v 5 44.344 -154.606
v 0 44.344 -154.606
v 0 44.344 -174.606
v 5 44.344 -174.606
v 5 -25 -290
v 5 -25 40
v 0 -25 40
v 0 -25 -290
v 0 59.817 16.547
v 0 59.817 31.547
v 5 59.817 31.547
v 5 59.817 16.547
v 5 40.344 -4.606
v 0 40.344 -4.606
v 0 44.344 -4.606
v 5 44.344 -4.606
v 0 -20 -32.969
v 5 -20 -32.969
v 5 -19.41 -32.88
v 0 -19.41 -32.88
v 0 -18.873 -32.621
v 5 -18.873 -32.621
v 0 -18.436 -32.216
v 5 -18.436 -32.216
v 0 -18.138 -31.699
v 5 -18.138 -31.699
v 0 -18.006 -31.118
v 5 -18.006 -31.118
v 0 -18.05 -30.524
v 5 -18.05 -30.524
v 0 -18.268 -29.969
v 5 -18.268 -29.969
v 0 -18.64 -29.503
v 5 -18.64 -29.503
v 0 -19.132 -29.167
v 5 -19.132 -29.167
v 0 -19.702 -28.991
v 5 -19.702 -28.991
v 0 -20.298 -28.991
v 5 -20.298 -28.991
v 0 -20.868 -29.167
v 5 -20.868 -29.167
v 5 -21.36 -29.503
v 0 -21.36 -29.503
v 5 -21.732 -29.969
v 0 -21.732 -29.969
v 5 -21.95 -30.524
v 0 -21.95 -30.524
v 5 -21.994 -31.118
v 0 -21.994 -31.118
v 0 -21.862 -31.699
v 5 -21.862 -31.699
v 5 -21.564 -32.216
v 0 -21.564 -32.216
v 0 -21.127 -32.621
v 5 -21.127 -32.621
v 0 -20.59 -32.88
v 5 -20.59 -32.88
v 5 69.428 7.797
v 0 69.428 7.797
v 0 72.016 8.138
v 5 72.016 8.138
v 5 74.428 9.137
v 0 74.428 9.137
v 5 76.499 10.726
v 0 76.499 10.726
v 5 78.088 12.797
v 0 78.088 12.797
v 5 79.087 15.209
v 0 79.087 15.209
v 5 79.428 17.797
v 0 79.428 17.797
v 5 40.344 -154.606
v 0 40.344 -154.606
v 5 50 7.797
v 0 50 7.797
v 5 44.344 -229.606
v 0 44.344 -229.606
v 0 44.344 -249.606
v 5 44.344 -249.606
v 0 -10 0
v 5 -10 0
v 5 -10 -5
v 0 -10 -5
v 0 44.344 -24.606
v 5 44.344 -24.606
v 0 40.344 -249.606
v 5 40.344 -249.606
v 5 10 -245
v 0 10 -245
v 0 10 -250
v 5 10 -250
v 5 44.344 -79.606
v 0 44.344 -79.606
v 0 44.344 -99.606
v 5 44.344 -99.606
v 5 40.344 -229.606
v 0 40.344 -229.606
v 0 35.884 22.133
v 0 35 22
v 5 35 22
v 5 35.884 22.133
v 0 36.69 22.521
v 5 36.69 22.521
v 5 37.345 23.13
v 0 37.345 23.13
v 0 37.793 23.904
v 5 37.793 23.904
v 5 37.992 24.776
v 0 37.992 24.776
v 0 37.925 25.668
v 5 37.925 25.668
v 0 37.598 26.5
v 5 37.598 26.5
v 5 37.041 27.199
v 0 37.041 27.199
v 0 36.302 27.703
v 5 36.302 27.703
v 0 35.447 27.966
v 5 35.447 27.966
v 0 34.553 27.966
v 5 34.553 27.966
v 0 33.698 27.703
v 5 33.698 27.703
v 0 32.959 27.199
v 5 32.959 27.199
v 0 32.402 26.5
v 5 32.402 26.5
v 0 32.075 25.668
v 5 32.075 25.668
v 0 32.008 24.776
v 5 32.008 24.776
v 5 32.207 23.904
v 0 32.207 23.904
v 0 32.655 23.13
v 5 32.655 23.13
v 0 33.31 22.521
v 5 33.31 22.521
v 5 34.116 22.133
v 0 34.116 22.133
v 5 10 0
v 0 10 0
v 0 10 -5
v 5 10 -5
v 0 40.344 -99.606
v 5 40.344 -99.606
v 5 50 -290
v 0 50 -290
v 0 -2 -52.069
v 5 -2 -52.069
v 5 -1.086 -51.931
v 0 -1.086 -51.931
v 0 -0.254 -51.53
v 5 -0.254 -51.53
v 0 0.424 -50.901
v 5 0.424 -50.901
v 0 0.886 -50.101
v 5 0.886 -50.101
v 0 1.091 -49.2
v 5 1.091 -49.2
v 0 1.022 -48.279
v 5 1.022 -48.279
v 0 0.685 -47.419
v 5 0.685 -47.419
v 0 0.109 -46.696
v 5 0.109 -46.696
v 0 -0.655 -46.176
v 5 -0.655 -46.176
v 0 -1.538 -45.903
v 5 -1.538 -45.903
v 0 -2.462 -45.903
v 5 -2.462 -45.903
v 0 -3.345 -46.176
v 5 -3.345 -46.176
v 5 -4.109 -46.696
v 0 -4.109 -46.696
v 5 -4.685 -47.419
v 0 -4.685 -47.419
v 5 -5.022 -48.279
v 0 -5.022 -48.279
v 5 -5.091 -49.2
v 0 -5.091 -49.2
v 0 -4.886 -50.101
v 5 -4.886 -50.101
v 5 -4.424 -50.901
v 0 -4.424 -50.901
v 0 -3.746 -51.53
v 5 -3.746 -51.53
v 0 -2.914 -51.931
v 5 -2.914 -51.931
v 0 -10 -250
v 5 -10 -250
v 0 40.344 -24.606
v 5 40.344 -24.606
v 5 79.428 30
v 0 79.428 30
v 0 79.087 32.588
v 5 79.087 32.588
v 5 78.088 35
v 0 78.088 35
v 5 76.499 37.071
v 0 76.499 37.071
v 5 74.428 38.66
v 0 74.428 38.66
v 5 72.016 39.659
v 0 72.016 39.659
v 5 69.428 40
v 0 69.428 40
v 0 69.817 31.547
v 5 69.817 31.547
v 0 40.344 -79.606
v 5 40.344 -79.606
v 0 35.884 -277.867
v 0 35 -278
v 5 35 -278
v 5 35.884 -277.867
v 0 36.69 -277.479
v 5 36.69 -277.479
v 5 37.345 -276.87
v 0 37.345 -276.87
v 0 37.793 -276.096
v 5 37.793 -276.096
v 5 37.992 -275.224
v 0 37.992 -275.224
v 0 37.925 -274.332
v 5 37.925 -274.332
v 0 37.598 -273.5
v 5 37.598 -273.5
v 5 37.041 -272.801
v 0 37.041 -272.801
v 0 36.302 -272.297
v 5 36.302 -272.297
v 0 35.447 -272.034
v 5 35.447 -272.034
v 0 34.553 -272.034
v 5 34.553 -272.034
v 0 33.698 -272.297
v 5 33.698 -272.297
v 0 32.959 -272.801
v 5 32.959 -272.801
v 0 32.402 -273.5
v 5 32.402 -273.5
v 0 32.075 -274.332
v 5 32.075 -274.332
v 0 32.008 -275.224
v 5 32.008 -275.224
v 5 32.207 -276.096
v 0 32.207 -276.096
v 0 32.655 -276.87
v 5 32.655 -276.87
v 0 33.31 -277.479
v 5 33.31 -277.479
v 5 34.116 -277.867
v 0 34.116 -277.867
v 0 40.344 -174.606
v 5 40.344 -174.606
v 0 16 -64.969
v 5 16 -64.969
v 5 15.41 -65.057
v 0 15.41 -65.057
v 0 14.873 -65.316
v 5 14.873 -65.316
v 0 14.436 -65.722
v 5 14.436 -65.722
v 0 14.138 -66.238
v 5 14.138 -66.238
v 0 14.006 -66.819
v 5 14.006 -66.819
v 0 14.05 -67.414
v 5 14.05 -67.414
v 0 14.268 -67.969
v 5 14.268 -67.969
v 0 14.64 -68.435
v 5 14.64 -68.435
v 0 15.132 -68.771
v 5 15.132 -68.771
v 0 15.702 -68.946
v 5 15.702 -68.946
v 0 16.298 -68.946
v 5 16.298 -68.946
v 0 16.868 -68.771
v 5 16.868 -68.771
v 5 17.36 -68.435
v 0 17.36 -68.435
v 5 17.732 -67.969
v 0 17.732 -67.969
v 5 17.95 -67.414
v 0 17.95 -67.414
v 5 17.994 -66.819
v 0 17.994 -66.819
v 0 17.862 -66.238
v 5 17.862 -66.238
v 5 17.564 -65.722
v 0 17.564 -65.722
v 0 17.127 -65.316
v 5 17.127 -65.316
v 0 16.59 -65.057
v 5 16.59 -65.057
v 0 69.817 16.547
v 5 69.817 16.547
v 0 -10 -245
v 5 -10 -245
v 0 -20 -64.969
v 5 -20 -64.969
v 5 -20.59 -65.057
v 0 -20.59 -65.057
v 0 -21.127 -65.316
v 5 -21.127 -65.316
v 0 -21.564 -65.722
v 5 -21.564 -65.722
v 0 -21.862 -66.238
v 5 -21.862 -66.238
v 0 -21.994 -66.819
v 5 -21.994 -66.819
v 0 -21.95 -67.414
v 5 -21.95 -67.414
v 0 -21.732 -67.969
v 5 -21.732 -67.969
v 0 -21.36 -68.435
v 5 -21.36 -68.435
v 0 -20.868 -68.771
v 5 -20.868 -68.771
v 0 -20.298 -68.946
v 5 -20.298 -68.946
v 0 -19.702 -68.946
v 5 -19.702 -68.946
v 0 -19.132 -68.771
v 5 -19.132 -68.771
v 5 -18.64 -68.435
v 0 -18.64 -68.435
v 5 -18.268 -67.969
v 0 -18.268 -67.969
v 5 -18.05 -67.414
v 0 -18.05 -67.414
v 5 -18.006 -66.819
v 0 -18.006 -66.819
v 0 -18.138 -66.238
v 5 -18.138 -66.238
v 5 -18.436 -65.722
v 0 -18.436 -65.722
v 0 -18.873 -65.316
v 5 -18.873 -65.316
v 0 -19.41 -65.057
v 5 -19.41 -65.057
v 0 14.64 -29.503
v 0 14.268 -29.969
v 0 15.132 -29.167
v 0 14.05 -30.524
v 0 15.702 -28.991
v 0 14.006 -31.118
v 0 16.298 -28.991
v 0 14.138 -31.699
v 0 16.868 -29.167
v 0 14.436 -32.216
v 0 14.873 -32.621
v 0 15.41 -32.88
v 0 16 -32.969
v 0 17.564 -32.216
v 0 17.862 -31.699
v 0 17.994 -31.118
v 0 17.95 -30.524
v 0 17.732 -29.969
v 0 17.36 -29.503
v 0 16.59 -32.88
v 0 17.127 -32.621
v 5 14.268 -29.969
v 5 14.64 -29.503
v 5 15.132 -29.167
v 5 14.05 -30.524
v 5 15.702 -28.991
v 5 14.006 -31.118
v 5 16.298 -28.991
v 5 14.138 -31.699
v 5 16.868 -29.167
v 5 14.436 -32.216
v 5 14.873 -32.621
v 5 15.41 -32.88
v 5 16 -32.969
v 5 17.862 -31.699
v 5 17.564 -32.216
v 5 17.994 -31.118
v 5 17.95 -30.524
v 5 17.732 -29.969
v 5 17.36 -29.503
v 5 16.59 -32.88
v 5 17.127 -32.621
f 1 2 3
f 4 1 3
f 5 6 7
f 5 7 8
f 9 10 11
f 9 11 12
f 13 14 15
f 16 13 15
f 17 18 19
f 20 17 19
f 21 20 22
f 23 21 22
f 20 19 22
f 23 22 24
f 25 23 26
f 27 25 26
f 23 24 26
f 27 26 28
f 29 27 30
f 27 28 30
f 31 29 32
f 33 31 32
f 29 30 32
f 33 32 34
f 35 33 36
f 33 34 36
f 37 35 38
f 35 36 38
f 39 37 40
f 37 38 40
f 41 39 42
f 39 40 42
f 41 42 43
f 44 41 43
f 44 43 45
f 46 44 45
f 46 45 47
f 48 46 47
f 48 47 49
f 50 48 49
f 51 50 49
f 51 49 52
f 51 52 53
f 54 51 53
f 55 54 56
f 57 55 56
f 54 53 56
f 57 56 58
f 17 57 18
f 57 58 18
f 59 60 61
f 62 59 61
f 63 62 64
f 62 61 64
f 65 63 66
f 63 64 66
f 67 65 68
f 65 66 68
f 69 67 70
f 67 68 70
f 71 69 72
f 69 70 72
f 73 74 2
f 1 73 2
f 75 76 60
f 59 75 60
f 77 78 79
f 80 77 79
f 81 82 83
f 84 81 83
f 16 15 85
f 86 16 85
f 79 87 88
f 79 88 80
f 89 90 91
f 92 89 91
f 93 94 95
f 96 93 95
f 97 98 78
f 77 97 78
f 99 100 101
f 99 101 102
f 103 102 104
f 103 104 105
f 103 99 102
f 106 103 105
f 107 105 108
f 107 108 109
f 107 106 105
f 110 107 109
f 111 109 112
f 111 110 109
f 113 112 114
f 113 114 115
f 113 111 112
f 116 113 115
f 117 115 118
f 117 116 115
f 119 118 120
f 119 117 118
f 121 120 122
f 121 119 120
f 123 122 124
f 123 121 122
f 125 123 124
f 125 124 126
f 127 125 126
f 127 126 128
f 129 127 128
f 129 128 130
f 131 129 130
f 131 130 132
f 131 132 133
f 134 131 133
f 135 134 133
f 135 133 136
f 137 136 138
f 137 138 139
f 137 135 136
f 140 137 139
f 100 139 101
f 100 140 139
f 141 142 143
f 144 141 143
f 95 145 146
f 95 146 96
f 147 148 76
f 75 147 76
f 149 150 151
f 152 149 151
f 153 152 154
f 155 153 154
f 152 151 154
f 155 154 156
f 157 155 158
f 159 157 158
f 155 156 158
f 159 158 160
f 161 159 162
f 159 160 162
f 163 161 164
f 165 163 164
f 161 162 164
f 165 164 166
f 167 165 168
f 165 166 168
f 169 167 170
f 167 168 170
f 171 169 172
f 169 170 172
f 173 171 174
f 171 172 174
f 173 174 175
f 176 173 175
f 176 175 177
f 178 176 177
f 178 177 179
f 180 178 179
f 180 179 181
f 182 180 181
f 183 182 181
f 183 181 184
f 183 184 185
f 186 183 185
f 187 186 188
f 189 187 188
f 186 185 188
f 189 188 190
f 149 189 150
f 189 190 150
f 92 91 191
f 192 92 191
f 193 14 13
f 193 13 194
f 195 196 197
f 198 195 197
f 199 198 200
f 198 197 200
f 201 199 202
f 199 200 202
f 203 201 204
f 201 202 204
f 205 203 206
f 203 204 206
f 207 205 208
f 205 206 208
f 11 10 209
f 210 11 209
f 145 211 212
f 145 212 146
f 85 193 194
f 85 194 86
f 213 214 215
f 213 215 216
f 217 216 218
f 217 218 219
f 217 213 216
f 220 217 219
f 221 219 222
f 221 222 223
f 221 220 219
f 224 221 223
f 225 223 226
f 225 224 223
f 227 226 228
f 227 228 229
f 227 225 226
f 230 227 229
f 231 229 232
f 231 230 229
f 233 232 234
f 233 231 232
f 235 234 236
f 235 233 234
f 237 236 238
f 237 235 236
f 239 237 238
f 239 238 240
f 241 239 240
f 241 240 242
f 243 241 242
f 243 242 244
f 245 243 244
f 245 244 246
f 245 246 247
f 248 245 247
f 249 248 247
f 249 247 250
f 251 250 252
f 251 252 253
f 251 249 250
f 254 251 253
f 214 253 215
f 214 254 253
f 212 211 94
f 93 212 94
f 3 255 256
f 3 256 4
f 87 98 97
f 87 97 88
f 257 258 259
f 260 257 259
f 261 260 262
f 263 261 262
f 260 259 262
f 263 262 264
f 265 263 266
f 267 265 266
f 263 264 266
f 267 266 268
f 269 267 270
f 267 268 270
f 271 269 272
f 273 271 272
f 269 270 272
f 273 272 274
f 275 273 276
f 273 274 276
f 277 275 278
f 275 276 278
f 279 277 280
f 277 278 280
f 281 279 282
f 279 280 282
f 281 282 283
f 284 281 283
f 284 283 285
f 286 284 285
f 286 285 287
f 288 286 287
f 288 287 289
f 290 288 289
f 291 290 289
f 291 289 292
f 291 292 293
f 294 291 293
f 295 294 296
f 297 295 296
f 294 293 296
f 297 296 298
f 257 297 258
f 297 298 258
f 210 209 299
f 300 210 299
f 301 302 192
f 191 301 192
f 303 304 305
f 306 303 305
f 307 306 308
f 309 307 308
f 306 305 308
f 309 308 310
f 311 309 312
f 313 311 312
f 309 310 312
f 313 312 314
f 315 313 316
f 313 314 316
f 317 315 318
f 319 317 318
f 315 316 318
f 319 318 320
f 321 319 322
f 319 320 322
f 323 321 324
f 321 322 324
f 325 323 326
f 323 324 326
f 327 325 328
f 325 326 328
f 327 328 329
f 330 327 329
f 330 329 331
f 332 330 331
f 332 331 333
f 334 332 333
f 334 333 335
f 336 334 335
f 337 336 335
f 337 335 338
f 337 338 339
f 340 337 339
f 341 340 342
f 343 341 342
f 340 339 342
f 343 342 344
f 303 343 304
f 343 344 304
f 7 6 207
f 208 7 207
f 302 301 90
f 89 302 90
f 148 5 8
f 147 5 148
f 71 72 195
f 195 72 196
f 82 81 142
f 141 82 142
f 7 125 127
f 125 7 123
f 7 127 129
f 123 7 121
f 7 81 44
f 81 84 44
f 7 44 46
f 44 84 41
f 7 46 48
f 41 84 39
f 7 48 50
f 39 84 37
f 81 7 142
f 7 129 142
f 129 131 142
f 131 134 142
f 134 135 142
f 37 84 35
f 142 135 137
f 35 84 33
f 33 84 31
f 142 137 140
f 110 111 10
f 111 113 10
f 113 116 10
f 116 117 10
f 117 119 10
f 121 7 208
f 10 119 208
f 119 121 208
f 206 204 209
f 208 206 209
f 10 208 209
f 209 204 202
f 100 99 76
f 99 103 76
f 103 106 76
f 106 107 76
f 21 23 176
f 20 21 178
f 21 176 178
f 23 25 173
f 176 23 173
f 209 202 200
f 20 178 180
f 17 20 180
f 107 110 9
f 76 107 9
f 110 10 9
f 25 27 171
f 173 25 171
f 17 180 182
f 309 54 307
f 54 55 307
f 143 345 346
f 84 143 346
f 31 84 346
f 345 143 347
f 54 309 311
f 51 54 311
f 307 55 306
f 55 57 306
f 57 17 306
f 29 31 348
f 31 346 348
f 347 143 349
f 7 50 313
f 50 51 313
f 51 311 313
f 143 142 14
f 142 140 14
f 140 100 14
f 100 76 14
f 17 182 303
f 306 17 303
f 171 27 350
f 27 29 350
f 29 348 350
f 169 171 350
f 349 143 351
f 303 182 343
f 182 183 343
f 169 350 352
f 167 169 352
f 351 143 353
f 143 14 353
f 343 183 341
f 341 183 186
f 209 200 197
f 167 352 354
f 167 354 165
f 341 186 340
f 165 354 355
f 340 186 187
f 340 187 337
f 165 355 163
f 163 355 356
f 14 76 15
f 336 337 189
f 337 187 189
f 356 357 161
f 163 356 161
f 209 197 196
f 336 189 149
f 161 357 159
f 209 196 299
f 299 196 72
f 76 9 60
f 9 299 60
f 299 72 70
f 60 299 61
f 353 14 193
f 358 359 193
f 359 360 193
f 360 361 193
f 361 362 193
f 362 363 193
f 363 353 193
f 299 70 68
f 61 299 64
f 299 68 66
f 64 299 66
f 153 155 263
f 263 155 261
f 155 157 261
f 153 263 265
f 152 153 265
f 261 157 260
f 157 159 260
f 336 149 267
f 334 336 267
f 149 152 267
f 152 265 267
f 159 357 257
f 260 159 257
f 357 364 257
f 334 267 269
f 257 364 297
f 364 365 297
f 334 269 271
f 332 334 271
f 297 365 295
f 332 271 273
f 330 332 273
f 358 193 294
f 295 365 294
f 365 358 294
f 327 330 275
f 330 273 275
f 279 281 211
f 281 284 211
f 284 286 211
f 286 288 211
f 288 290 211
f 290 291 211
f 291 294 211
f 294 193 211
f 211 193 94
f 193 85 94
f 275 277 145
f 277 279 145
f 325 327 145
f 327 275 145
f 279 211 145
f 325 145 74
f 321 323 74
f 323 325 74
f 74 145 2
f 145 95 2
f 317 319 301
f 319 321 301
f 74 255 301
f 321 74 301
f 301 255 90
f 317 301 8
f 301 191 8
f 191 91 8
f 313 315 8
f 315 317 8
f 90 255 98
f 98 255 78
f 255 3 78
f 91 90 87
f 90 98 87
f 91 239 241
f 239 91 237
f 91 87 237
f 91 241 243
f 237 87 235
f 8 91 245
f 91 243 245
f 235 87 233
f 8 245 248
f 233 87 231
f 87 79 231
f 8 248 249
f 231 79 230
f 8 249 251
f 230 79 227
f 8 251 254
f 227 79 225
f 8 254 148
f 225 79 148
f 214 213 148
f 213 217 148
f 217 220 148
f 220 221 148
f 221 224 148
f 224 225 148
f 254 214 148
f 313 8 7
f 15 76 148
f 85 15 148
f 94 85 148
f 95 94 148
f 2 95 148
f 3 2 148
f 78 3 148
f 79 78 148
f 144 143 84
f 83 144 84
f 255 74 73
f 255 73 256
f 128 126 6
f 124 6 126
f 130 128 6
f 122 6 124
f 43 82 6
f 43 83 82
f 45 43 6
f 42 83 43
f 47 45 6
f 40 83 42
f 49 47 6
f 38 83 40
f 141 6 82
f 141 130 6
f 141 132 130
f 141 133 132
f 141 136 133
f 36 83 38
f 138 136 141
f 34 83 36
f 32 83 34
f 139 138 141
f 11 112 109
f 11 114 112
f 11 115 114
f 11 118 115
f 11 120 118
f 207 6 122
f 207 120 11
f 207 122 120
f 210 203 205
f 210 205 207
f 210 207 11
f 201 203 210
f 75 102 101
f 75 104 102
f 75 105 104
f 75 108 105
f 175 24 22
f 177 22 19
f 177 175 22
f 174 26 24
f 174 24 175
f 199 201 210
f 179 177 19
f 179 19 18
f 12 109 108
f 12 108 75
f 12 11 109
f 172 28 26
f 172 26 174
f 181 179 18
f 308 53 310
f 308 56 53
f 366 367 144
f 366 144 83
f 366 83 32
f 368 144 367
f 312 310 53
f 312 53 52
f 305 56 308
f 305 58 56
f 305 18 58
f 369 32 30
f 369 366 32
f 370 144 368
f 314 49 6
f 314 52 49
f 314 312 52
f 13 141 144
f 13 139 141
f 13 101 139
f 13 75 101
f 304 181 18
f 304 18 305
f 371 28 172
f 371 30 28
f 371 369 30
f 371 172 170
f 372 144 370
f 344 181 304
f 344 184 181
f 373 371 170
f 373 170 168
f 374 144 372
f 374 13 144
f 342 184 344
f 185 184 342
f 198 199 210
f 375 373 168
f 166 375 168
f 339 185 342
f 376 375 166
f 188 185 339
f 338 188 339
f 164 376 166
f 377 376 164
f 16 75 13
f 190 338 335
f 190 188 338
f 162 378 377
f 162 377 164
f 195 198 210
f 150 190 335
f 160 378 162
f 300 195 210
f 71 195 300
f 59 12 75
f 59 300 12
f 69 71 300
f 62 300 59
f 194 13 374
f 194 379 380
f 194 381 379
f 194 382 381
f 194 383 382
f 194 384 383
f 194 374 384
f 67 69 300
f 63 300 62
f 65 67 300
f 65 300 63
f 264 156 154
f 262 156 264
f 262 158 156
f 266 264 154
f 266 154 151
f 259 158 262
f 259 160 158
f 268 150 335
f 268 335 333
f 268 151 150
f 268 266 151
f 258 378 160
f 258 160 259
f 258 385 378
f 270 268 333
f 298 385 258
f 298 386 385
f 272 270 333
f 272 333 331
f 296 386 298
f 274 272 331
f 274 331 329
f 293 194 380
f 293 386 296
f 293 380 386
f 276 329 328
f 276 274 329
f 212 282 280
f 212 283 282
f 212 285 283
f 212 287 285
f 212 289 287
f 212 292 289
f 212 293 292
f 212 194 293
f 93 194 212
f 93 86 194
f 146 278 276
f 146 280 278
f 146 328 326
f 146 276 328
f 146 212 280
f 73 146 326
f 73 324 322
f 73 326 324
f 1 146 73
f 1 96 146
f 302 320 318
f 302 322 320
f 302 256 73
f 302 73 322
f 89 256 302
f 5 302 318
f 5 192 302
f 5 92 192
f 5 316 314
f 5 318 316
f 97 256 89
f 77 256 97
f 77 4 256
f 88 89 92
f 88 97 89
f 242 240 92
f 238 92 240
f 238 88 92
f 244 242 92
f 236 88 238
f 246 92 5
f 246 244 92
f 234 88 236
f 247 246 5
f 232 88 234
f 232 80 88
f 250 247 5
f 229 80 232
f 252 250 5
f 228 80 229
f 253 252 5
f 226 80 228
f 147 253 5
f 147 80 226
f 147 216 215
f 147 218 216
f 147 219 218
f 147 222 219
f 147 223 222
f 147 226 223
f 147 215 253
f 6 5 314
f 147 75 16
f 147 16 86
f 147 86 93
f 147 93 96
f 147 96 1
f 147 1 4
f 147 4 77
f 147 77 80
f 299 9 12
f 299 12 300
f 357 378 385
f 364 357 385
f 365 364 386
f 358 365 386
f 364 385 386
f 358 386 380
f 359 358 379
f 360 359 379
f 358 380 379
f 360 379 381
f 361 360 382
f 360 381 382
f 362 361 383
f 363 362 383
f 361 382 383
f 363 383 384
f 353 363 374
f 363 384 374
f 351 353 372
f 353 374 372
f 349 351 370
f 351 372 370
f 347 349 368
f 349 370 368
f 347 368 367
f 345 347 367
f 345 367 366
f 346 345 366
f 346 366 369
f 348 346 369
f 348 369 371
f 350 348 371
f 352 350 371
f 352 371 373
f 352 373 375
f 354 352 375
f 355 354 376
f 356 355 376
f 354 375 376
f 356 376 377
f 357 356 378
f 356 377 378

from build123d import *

# Parameters (mm, degrees)
SKETCH5_R           = 3
SKETCH5_W           = 20
SKETCH5_H           = 4
SKETCH5_W_2         = 15
SKETCH5_H_2         = 10
BOSS_EXTRUDE1_DEPTH = 5
SKETCH6_W           = 330
SKETCH6_H           = 15
BOSS_EXTRUDE2_DEPTH = 5
SKETCH8_R           = 2
SKETCH8_R_2         = 3.1
CUT_EXTRUDE1_DEPTH  = 5


with BuildPart() as part:
    # Sketch5 → Boss-Extrude1 (new body)
    with BuildSketch(Plane(origin=(0, 0, 0), x_dir=(0, 0, -1), z_dir=(1, 0, 0))):
        with BuildLine():
            Line((-40, -10), (0, -10))
            Line((0, -10), (0, 0))
            Line((0, 0), (0, 10))
            Line((0, 10), (5, 10))
            Line((5, 10), (5, 0))
            Line((5, 0), (5, -10))
            Line((5, -10), (245, -10))
            Line((245, -10), (245, 0))
            Line((245, 0), (245, 10))
            Line((245, 10), (250, 10))
            Line((250, 10), (250, 0))
            Line((250, 0), (250, -10))
            Line((250, -10), (290, -10))
            Line((290, -10), (290, 50))
            Line((290, 50), (-7.797224701, 50))
            Line((-7.797224701, 50), (-7.797224701, 69.428123594))
            ThreePointArc((-7.797224701, 69.428123594), (-10.726156889, 76.499191405), (-17.797224701, 79.428123594))
            Line((-17.797224701, 79.428123594), (-30, 79.428123594))
            ThreePointArc((-30, 79.428123594), (-37.071067812, 76.499191405), (-40, 69.428123594))
            Line((-40, 69.428123594), (-40, 50))
            Line((-40, 50), (-40, -10))
        make_face()
        with Locations((-25, 35)):
            Circle(SKETCH5_R, mode=Mode.SUBTRACT)
        with Locations((275, 35)):
            Circle(SKETCH5_R, mode=Mode.SUBTRACT)
        with Locations((89.606343961, 42.344097949)):
            Rectangle(SKETCH5_W, SKETCH5_H, mode=Mode.SUBTRACT)
        with Locations((14.606343961, 42.344097949)):
            Rectangle(SKETCH5_W, SKETCH5_H, mode=Mode.SUBTRACT)
        with Locations((-24.047224701, 64.816848726)):
            Rectangle(SKETCH5_W_2, SKETCH5_H_2, mode=Mode.SUBTRACT)
        with Locations((164.606343961, 42.344097949)):
            Rectangle(SKETCH5_W, SKETCH5_H, mode=Mode.SUBTRACT)
        with Locations((239.606343961, 42.344097949)):
            Rectangle(SKETCH5_W, SKETCH5_H, mode=Mode.SUBTRACT)
    extrude(amount=BOSS_EXTRUDE1_DEPTH)

    # Sketch6 → Boss-Extrude2 (add)
    with BuildSketch(Plane(origin=(5, 0, 0), x_dir=(0, 0, -1), z_dir=(1, 0, 0))):
        with Locations((125, -17.5)):
            Rectangle(SKETCH6_W, SKETCH6_H)
    extrude(amount=-BOSS_EXTRUDE2_DEPTH)

    # Sketch8 → Cut-Extrude1 (cut)
    with BuildSketch(Plane(origin=(5, 0, 0), x_dir=(0, 0, -1), z_dir=(1, 0, 0))):
        with Locations((30.968640194, 16)):
            Circle(SKETCH8_R)
        with Locations((30.968640194, -20)):
            Circle(SKETCH8_R)
        with Locations(Location((66.968640194, -20, 0), (0, 0, 180))):
            Circle(SKETCH8_R)
        with Locations(Location((66.968640194, 16, 0), (0, 0, 180))):
            Circle(SKETCH8_R)
        with Locations((48.968640194, -2)):
            Circle(SKETCH8_R_2)
    extrude(amount=-CUT_EXTRUDE1_DEPTH, mode=Mode.SUBTRACT)


solid = part.part
